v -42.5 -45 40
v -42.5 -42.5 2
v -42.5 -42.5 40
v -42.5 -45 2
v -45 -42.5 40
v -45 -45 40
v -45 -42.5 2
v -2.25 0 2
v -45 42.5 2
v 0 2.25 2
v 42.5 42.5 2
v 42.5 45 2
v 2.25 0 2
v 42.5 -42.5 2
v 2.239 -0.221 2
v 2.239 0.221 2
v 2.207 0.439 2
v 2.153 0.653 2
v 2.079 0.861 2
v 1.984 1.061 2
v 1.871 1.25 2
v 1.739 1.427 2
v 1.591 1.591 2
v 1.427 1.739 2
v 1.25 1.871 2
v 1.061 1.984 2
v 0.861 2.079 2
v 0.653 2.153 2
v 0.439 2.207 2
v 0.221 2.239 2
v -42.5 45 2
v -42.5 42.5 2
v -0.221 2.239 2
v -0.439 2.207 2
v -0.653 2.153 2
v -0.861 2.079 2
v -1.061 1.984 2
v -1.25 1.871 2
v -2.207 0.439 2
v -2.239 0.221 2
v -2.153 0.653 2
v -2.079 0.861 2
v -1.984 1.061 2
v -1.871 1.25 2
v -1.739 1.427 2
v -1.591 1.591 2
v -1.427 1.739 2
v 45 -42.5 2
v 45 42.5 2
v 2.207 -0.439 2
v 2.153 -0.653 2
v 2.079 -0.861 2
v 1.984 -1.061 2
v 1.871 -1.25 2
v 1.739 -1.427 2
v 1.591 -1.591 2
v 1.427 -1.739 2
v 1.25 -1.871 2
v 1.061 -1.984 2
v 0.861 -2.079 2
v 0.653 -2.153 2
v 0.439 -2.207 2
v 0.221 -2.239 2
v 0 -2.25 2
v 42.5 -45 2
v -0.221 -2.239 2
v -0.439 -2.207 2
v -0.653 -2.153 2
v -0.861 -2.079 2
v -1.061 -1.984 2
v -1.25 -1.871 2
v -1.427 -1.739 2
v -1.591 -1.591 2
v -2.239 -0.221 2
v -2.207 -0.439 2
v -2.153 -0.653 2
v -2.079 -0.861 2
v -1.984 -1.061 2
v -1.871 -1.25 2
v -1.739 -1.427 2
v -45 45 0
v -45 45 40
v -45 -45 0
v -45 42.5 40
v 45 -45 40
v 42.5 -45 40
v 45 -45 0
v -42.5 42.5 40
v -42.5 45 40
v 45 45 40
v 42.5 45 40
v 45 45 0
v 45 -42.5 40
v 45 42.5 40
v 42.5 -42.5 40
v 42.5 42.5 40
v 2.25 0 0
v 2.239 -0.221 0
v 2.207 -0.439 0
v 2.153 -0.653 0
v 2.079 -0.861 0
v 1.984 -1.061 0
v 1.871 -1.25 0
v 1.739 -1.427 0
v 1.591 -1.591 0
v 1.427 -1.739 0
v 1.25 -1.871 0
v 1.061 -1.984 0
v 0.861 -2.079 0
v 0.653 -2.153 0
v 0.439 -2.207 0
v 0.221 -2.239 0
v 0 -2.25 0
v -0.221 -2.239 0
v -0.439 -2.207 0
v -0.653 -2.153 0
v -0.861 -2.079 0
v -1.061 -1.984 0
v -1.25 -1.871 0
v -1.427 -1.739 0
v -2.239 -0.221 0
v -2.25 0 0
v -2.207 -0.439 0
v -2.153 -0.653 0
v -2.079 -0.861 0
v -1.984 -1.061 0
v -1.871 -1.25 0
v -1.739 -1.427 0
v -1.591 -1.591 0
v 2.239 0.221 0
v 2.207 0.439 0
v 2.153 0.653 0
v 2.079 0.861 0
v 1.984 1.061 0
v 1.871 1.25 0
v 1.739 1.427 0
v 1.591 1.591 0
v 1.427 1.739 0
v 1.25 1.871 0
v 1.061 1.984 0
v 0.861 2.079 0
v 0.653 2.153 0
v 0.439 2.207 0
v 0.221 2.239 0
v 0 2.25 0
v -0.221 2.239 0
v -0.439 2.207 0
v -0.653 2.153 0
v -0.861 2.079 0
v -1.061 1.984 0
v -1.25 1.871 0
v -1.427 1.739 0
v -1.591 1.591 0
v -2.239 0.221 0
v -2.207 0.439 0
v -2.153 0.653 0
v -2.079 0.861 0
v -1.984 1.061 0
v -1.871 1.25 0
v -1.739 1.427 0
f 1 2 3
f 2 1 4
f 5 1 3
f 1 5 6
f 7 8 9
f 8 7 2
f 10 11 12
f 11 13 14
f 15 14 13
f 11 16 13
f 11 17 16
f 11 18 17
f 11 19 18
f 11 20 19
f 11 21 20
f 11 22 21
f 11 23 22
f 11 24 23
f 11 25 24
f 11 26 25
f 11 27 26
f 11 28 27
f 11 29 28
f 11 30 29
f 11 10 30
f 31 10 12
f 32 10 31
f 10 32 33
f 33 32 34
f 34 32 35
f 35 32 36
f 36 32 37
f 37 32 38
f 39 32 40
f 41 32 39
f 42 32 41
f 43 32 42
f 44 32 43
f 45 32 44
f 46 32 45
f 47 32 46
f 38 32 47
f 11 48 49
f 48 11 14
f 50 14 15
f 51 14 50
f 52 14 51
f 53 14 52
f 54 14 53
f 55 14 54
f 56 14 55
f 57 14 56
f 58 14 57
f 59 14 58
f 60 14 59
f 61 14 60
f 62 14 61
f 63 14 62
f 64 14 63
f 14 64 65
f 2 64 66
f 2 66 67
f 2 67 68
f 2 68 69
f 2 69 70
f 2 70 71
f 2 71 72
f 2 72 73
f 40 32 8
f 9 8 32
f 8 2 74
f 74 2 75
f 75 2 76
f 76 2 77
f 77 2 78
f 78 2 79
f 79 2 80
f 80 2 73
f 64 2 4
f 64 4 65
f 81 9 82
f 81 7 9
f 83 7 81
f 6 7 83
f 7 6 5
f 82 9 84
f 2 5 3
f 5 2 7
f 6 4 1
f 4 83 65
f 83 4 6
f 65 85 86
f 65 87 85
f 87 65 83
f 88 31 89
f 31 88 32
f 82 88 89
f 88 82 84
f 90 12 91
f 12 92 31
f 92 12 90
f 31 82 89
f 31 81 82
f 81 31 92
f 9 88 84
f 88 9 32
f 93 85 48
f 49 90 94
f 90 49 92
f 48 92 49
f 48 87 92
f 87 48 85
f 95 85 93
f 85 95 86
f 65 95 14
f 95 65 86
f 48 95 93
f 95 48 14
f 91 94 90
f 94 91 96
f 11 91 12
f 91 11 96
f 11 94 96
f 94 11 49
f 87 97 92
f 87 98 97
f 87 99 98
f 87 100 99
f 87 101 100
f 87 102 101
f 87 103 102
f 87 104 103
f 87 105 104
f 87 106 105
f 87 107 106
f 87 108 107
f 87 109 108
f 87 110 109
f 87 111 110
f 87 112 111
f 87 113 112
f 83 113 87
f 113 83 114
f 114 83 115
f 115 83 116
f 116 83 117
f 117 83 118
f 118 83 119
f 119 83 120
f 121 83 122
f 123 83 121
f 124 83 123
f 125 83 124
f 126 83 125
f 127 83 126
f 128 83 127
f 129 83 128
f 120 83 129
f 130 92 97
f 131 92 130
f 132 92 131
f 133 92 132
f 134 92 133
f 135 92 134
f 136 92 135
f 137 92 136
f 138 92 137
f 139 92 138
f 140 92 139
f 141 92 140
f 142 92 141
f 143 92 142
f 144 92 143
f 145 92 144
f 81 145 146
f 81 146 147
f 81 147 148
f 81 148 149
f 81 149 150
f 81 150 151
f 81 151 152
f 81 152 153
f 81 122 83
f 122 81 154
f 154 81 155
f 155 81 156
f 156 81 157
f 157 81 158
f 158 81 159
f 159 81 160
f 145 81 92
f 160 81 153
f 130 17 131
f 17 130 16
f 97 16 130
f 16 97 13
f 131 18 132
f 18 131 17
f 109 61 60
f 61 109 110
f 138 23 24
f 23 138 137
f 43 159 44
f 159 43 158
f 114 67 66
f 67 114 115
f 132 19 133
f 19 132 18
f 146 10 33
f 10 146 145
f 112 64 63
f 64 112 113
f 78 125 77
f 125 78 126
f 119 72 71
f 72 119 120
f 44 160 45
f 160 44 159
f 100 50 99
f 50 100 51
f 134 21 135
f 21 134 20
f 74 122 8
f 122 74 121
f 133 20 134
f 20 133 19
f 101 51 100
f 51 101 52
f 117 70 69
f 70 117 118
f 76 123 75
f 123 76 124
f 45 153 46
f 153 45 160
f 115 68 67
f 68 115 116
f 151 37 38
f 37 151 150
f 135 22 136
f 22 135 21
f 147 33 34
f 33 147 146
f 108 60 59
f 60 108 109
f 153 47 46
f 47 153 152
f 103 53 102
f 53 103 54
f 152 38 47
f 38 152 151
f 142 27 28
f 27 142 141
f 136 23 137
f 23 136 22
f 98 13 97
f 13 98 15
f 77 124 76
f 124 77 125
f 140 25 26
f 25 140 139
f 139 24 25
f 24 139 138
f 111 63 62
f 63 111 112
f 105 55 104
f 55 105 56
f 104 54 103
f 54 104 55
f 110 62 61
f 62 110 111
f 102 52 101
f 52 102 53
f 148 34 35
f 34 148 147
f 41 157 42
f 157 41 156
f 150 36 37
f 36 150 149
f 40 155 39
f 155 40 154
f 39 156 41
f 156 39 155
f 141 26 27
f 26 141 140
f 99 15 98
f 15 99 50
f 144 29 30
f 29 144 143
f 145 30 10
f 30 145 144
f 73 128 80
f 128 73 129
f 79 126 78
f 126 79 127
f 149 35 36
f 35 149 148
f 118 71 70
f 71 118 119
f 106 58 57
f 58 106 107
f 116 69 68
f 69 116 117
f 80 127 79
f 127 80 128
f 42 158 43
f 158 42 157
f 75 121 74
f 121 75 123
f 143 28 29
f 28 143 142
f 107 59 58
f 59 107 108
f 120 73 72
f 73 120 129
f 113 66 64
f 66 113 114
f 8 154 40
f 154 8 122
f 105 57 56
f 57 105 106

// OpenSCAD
// Magnetic stirrer housing for 80 mm PC case fan
// Print orientation: top plate on bed (z = 0), open top at z = 40

// ---- Dimensions (mm) ----
top_t       = 2;     // top plate thickness
wall_t      = 2.5;   // wall thickness
box_h       = 40;    // total height of box (open top)
outer_w     = 90;    // outer size in X
outer_d     = 90;    // outer size in Y
hole        = 4.5;   // M4 screw hole diameter
hole_pitch  = 71.5;  // square pattern size for screw holes
notch_w     = 12;    // cable notch width
notch_bottom = 8;    // notch depth from open edge (z = 32)
eps         = 0.5;   // cutter overshoot

$fn = 64;

difference() {
    // Main box body
    union() {
        // Top plate
        translate([-outer_w/2, -outer_d/2, 0])
            cube([outer_w, outer_d, top_t]);
        // Walls
        for (sx = [-1, 1], sy = [-1, 1])
            translate([sx > 0 ? outer_w/2 - wall_t : -outer_w/2,
                       sy > 0 ? outer_d/2 - wall_t : -outer_d/2,
                       top_t])
                cube([wall_t, wall_t, box_h - top_t]);
    }

    // Screw holes through top plate
    for (i = [0:3])
        rotate([0, 0, i * 90])
            translate([0, 0, -eps])
                cylinder(d = hole, h = top_t + 2 * eps);

    // Cable notch in one wall (z = 32 to 40)
    translate([outer_w/2 - wall_t, -notch_w/2, notch_bottom])
        cube([wall_t + eps, notch_w, notch_bottom + eps]);
}
